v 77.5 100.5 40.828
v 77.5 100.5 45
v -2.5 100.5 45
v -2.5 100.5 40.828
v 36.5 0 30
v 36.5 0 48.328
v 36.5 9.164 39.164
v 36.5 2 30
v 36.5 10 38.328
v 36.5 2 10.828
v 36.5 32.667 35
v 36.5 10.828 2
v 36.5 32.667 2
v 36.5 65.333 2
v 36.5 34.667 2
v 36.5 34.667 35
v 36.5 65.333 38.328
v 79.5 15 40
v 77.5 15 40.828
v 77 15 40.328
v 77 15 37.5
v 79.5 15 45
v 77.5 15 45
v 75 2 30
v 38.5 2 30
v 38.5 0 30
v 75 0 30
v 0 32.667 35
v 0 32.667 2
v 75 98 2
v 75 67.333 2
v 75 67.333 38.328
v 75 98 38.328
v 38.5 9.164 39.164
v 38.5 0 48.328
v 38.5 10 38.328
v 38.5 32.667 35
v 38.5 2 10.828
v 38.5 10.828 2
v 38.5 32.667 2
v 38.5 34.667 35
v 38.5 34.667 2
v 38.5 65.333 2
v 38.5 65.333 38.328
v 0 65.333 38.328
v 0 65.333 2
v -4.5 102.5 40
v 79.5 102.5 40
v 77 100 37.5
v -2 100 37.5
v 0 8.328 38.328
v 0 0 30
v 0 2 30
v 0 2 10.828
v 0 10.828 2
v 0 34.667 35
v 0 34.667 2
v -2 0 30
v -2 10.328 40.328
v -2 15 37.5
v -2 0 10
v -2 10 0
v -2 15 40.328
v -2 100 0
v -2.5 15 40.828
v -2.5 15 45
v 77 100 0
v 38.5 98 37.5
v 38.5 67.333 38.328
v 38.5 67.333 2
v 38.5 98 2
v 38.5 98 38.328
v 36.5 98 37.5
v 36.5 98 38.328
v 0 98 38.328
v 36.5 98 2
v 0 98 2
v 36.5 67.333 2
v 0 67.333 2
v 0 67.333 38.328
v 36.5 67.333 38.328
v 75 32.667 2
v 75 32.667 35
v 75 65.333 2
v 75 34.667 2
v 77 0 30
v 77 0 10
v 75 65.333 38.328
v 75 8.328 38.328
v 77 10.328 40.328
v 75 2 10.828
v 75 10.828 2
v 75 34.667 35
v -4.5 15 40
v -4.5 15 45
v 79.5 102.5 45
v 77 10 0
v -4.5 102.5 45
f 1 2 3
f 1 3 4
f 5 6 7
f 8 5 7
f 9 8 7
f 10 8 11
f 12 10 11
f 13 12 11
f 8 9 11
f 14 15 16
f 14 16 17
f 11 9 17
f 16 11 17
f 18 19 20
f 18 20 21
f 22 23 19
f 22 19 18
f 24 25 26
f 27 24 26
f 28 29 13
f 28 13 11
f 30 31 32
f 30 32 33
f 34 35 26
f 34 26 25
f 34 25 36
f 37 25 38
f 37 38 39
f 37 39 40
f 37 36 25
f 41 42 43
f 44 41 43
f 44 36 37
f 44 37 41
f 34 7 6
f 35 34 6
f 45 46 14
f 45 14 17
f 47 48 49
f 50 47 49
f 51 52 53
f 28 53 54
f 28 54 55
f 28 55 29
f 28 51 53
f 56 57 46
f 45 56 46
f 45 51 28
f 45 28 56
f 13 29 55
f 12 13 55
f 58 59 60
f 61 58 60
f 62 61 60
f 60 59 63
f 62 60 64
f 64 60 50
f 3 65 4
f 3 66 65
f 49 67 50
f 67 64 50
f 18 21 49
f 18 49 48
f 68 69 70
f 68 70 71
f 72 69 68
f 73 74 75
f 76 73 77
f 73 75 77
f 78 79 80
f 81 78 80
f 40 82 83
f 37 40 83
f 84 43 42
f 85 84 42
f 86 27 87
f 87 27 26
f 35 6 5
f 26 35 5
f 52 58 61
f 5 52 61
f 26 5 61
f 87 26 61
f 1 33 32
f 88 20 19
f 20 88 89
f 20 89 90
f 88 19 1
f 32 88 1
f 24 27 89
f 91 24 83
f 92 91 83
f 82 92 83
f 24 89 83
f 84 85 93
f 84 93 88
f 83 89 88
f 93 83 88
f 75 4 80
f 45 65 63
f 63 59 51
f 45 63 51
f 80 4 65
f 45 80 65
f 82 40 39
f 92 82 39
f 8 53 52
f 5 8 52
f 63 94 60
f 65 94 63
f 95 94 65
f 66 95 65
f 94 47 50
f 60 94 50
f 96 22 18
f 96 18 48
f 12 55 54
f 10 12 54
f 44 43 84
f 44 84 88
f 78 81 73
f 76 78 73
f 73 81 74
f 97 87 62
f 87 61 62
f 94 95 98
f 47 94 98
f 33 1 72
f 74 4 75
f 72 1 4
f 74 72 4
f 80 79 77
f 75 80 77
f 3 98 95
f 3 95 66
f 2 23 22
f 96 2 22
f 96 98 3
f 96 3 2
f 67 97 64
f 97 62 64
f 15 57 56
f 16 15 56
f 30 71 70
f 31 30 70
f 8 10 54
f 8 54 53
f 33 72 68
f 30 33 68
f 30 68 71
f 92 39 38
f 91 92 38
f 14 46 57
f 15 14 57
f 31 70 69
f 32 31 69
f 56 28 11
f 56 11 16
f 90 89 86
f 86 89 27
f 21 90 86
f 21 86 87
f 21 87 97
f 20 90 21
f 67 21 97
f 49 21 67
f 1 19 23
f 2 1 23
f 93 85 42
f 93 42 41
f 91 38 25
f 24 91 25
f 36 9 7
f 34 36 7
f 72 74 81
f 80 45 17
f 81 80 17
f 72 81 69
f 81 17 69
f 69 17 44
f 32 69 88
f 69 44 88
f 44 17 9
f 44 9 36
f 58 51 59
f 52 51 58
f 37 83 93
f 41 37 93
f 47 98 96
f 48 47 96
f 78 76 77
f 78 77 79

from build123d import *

# Parameters (mm, degrees)
F1_DEPTH  = 2
F2_W      = 2
F2_H      = 33
F2_H_2    = 38
F3_DEPTH  = 75
F5_DEPTH  = 2
F6_W      = 2.5
F6_H      = 87.5
F7_DEPTH  = 7.5
F9_DEPTH  = 102.501
F11_DEPTH = 84.001
F13_DEPTH = 98
F15_DEPTH = 2.5
F17_DEPTH = 2.5
F19_DEPTH = 2.5
F21_DEPTH = 2.5
F23_W     = 30.666666667
F23_H     = 0.8284271247
F23_W_2   = 30.6666666667
F23_H_2   = 35.5
F24_DEPTH = 2


# Not quite as in the source:
# - a feature names something its author has since deleted; it is built from what else it names


with BuildPart() as f1:
    # F0 (on Right) → F1 (new body)
    with BuildSketch(Plane.YZ):
        Polygon((0, 10), (10, 0), (100, 0), (100, 37.5), (100, 45), (15, 45), (0, 30), align=None)
        Polygon((100, 45), (100, 37.5), (102.5, 40), (102.5, 45), align=None)
    extrude(amount=-F1_DEPTH)

    # F2 (on face) → F3 (join)
    with BuildSketch(Plane.YZ):
        Polygon((2, 30), (0, 30), (0, 10), (10, 0), (100, 0), (100, 37.5), (102.5, 40), (102.5, 45), (100.5, 45), (100.5, 40.8284271247), (98, 38.3284271247), (98, 2), (67.3333333333, 2), (65.3333333333, 2), (34.6666666667, 2), (32.6666666667, 2), (10.8284271247, 2), (2, 10.8284271247), align=None)
        with Locations((33.6666666667, 18.5)):
            Rectangle(F2_W, F2_H)
        with Locations((66.3333333333, 21)):
            Rectangle(F2_W, F2_H_2)
    extrude(amount=F3_DEPTH)

    # F4 (on face) → F5 (join)
    with BuildSketch(Plane.YZ.offset(75)):
        Polygon((100.5, 45), (15, 45), (0, 30), (0, 10), (10, 0), (100, 0), (100, 37.5), (102.5, 40), (102.5, 45), align=None)
    extrude(amount=F5_DEPTH)

    # F6 (on face) → F7 (join)
    with BuildSketch(Plane.XY.offset(45)):
        with Locations((-3.25, 58.75)):
            Rectangle(F6_W, F6_H)
        with Locations((78.25, 58.75)):
            Rectangle(F6_W, F6_H)
    extrude(amount=-F7_DEPTH)

    # F8 (on face) → F9 (cut, through all)
    with BuildSketch(Plane(origin=(0, 102.5, 0), x_dir=(-1, 0, 0), z_dir=(0, 1, 0))):
        Polygon((-79.5, 37.5), (-77, 37.5), (-79.5, 40), align=None)
        Polygon((4.5, 40), (2, 37.5), (4.5, 37.5), align=None)
    extrude(amount=-F9_DEPTH, mode=Mode.SUBTRACT)

    # F10 (on face) → F11 (cut, through all)
    with BuildSketch(Plane.YZ.offset(79.5)):
        Polygon((100, 37.5), (102.5, 37.5), (102.5, 40), align=None)
    extrude(amount=-F11_DEPTH, mode=Mode.SUBTRACT)

    # F12 (on face) → F13 (cut, through all)
    with BuildSketch(Plane.XZ):
        Polygon((77, 45), (75, 45), (0, 45), (-2, 45), (-2.5, 45), (-2.5, 40.8284271247), (0, 38.3284271247), (75, 38.3284271247), (75.3564065228, 38.6848336475), (77.5, 40.8284271247), (77.5, 45), align=None)
    extrude(amount=-F13_DEPTH, mode=Mode.SUBTRACT)

    # F14 (on face) → F15 (cut, through all)
    with BuildSketch(Plane(origin=(75, 0, 0), x_dir=(0, -1, 0), z_dir=(-1, 0, 0))):
        Polygon((-100.5, 40.8284271247), (-98, 38.3284271247), (-98, 45), (-100.5, 45), align=None)
    extrude(amount=-F15_DEPTH, mode=Mode.SUBTRACT)

    # F16 (on face) → F17 (join, through all)
    with BuildSketch(Plane(origin=(0, 98, 0), x_dir=(-1, 0, 0), z_dir=(0, 1, 0))):
        Polygon((-77.5, 38.3284271247), (-75, 38.3284271247), (-77.5, 40.8284271247), align=None)
    extrude(amount=F17_DEPTH)

    # F18 (on face) → F19 (cut, through all)
    with BuildSketch(Plane.YZ):
        Polygon((100.5, 40.8284271247), (100.5, 45), (98, 45), (98, 38.3284271247), align=None)
    extrude(amount=-F19_DEPTH, mode=Mode.SUBTRACT)

    # F20 (on face) → F21 (join, through all)
    with BuildSketch(Plane(origin=(0, 98, 0), x_dir=(-1, 0, 0), z_dir=(0, 1, 0))):
        Polygon((2.5, 38.3284271247), (2.5, 40.8284271247), (0, 38.3284271247), align=None)
    extrude(amount=F21_DEPTH)

    # F23 (on offset) → F24 (join)
    with BuildSketch(Plane.YZ.offset(36.5)):
        with Locations((82.6666666668, 37.9142135624)):
            Rectangle(F23_W, F23_H)
        with Locations((82.6666666667, 19.75)):
            Rectangle(F23_W_2, F23_H_2)
        Polygon((65.3333333333, 2), (65.3333333333, 37.5), (65.3333333333, 38.3284271247), (10, 38.3284271247), (10, 2.8284271247), (10.8284271247, 2), (32.6666666667, 2), (32.6666666667, 35), (34.6666666667, 35), (34.6666666667, 2), align=None)
        Polygon((10, 2.8284271247), (10, 38.3284271247), (2, 30), (2, 10.8284271247), align=None)
        Polygon((0, 30), (8.3284271248, 38.3284271248), (9.1642135624, 39.1642135624), (0, 48.3284271247), align=None)
        Polygon((2, 30), (10, 38.3284271247), (8.3284271251, 38.3284271247), (0, 30), align=None)
        Polygon((8.3284271251, 38.3284271247), (10, 38.3284271247), (9.1642135624, 39.1642135624), align=None)
    extrude(amount=F24_DEPTH)


solid = f1.part
